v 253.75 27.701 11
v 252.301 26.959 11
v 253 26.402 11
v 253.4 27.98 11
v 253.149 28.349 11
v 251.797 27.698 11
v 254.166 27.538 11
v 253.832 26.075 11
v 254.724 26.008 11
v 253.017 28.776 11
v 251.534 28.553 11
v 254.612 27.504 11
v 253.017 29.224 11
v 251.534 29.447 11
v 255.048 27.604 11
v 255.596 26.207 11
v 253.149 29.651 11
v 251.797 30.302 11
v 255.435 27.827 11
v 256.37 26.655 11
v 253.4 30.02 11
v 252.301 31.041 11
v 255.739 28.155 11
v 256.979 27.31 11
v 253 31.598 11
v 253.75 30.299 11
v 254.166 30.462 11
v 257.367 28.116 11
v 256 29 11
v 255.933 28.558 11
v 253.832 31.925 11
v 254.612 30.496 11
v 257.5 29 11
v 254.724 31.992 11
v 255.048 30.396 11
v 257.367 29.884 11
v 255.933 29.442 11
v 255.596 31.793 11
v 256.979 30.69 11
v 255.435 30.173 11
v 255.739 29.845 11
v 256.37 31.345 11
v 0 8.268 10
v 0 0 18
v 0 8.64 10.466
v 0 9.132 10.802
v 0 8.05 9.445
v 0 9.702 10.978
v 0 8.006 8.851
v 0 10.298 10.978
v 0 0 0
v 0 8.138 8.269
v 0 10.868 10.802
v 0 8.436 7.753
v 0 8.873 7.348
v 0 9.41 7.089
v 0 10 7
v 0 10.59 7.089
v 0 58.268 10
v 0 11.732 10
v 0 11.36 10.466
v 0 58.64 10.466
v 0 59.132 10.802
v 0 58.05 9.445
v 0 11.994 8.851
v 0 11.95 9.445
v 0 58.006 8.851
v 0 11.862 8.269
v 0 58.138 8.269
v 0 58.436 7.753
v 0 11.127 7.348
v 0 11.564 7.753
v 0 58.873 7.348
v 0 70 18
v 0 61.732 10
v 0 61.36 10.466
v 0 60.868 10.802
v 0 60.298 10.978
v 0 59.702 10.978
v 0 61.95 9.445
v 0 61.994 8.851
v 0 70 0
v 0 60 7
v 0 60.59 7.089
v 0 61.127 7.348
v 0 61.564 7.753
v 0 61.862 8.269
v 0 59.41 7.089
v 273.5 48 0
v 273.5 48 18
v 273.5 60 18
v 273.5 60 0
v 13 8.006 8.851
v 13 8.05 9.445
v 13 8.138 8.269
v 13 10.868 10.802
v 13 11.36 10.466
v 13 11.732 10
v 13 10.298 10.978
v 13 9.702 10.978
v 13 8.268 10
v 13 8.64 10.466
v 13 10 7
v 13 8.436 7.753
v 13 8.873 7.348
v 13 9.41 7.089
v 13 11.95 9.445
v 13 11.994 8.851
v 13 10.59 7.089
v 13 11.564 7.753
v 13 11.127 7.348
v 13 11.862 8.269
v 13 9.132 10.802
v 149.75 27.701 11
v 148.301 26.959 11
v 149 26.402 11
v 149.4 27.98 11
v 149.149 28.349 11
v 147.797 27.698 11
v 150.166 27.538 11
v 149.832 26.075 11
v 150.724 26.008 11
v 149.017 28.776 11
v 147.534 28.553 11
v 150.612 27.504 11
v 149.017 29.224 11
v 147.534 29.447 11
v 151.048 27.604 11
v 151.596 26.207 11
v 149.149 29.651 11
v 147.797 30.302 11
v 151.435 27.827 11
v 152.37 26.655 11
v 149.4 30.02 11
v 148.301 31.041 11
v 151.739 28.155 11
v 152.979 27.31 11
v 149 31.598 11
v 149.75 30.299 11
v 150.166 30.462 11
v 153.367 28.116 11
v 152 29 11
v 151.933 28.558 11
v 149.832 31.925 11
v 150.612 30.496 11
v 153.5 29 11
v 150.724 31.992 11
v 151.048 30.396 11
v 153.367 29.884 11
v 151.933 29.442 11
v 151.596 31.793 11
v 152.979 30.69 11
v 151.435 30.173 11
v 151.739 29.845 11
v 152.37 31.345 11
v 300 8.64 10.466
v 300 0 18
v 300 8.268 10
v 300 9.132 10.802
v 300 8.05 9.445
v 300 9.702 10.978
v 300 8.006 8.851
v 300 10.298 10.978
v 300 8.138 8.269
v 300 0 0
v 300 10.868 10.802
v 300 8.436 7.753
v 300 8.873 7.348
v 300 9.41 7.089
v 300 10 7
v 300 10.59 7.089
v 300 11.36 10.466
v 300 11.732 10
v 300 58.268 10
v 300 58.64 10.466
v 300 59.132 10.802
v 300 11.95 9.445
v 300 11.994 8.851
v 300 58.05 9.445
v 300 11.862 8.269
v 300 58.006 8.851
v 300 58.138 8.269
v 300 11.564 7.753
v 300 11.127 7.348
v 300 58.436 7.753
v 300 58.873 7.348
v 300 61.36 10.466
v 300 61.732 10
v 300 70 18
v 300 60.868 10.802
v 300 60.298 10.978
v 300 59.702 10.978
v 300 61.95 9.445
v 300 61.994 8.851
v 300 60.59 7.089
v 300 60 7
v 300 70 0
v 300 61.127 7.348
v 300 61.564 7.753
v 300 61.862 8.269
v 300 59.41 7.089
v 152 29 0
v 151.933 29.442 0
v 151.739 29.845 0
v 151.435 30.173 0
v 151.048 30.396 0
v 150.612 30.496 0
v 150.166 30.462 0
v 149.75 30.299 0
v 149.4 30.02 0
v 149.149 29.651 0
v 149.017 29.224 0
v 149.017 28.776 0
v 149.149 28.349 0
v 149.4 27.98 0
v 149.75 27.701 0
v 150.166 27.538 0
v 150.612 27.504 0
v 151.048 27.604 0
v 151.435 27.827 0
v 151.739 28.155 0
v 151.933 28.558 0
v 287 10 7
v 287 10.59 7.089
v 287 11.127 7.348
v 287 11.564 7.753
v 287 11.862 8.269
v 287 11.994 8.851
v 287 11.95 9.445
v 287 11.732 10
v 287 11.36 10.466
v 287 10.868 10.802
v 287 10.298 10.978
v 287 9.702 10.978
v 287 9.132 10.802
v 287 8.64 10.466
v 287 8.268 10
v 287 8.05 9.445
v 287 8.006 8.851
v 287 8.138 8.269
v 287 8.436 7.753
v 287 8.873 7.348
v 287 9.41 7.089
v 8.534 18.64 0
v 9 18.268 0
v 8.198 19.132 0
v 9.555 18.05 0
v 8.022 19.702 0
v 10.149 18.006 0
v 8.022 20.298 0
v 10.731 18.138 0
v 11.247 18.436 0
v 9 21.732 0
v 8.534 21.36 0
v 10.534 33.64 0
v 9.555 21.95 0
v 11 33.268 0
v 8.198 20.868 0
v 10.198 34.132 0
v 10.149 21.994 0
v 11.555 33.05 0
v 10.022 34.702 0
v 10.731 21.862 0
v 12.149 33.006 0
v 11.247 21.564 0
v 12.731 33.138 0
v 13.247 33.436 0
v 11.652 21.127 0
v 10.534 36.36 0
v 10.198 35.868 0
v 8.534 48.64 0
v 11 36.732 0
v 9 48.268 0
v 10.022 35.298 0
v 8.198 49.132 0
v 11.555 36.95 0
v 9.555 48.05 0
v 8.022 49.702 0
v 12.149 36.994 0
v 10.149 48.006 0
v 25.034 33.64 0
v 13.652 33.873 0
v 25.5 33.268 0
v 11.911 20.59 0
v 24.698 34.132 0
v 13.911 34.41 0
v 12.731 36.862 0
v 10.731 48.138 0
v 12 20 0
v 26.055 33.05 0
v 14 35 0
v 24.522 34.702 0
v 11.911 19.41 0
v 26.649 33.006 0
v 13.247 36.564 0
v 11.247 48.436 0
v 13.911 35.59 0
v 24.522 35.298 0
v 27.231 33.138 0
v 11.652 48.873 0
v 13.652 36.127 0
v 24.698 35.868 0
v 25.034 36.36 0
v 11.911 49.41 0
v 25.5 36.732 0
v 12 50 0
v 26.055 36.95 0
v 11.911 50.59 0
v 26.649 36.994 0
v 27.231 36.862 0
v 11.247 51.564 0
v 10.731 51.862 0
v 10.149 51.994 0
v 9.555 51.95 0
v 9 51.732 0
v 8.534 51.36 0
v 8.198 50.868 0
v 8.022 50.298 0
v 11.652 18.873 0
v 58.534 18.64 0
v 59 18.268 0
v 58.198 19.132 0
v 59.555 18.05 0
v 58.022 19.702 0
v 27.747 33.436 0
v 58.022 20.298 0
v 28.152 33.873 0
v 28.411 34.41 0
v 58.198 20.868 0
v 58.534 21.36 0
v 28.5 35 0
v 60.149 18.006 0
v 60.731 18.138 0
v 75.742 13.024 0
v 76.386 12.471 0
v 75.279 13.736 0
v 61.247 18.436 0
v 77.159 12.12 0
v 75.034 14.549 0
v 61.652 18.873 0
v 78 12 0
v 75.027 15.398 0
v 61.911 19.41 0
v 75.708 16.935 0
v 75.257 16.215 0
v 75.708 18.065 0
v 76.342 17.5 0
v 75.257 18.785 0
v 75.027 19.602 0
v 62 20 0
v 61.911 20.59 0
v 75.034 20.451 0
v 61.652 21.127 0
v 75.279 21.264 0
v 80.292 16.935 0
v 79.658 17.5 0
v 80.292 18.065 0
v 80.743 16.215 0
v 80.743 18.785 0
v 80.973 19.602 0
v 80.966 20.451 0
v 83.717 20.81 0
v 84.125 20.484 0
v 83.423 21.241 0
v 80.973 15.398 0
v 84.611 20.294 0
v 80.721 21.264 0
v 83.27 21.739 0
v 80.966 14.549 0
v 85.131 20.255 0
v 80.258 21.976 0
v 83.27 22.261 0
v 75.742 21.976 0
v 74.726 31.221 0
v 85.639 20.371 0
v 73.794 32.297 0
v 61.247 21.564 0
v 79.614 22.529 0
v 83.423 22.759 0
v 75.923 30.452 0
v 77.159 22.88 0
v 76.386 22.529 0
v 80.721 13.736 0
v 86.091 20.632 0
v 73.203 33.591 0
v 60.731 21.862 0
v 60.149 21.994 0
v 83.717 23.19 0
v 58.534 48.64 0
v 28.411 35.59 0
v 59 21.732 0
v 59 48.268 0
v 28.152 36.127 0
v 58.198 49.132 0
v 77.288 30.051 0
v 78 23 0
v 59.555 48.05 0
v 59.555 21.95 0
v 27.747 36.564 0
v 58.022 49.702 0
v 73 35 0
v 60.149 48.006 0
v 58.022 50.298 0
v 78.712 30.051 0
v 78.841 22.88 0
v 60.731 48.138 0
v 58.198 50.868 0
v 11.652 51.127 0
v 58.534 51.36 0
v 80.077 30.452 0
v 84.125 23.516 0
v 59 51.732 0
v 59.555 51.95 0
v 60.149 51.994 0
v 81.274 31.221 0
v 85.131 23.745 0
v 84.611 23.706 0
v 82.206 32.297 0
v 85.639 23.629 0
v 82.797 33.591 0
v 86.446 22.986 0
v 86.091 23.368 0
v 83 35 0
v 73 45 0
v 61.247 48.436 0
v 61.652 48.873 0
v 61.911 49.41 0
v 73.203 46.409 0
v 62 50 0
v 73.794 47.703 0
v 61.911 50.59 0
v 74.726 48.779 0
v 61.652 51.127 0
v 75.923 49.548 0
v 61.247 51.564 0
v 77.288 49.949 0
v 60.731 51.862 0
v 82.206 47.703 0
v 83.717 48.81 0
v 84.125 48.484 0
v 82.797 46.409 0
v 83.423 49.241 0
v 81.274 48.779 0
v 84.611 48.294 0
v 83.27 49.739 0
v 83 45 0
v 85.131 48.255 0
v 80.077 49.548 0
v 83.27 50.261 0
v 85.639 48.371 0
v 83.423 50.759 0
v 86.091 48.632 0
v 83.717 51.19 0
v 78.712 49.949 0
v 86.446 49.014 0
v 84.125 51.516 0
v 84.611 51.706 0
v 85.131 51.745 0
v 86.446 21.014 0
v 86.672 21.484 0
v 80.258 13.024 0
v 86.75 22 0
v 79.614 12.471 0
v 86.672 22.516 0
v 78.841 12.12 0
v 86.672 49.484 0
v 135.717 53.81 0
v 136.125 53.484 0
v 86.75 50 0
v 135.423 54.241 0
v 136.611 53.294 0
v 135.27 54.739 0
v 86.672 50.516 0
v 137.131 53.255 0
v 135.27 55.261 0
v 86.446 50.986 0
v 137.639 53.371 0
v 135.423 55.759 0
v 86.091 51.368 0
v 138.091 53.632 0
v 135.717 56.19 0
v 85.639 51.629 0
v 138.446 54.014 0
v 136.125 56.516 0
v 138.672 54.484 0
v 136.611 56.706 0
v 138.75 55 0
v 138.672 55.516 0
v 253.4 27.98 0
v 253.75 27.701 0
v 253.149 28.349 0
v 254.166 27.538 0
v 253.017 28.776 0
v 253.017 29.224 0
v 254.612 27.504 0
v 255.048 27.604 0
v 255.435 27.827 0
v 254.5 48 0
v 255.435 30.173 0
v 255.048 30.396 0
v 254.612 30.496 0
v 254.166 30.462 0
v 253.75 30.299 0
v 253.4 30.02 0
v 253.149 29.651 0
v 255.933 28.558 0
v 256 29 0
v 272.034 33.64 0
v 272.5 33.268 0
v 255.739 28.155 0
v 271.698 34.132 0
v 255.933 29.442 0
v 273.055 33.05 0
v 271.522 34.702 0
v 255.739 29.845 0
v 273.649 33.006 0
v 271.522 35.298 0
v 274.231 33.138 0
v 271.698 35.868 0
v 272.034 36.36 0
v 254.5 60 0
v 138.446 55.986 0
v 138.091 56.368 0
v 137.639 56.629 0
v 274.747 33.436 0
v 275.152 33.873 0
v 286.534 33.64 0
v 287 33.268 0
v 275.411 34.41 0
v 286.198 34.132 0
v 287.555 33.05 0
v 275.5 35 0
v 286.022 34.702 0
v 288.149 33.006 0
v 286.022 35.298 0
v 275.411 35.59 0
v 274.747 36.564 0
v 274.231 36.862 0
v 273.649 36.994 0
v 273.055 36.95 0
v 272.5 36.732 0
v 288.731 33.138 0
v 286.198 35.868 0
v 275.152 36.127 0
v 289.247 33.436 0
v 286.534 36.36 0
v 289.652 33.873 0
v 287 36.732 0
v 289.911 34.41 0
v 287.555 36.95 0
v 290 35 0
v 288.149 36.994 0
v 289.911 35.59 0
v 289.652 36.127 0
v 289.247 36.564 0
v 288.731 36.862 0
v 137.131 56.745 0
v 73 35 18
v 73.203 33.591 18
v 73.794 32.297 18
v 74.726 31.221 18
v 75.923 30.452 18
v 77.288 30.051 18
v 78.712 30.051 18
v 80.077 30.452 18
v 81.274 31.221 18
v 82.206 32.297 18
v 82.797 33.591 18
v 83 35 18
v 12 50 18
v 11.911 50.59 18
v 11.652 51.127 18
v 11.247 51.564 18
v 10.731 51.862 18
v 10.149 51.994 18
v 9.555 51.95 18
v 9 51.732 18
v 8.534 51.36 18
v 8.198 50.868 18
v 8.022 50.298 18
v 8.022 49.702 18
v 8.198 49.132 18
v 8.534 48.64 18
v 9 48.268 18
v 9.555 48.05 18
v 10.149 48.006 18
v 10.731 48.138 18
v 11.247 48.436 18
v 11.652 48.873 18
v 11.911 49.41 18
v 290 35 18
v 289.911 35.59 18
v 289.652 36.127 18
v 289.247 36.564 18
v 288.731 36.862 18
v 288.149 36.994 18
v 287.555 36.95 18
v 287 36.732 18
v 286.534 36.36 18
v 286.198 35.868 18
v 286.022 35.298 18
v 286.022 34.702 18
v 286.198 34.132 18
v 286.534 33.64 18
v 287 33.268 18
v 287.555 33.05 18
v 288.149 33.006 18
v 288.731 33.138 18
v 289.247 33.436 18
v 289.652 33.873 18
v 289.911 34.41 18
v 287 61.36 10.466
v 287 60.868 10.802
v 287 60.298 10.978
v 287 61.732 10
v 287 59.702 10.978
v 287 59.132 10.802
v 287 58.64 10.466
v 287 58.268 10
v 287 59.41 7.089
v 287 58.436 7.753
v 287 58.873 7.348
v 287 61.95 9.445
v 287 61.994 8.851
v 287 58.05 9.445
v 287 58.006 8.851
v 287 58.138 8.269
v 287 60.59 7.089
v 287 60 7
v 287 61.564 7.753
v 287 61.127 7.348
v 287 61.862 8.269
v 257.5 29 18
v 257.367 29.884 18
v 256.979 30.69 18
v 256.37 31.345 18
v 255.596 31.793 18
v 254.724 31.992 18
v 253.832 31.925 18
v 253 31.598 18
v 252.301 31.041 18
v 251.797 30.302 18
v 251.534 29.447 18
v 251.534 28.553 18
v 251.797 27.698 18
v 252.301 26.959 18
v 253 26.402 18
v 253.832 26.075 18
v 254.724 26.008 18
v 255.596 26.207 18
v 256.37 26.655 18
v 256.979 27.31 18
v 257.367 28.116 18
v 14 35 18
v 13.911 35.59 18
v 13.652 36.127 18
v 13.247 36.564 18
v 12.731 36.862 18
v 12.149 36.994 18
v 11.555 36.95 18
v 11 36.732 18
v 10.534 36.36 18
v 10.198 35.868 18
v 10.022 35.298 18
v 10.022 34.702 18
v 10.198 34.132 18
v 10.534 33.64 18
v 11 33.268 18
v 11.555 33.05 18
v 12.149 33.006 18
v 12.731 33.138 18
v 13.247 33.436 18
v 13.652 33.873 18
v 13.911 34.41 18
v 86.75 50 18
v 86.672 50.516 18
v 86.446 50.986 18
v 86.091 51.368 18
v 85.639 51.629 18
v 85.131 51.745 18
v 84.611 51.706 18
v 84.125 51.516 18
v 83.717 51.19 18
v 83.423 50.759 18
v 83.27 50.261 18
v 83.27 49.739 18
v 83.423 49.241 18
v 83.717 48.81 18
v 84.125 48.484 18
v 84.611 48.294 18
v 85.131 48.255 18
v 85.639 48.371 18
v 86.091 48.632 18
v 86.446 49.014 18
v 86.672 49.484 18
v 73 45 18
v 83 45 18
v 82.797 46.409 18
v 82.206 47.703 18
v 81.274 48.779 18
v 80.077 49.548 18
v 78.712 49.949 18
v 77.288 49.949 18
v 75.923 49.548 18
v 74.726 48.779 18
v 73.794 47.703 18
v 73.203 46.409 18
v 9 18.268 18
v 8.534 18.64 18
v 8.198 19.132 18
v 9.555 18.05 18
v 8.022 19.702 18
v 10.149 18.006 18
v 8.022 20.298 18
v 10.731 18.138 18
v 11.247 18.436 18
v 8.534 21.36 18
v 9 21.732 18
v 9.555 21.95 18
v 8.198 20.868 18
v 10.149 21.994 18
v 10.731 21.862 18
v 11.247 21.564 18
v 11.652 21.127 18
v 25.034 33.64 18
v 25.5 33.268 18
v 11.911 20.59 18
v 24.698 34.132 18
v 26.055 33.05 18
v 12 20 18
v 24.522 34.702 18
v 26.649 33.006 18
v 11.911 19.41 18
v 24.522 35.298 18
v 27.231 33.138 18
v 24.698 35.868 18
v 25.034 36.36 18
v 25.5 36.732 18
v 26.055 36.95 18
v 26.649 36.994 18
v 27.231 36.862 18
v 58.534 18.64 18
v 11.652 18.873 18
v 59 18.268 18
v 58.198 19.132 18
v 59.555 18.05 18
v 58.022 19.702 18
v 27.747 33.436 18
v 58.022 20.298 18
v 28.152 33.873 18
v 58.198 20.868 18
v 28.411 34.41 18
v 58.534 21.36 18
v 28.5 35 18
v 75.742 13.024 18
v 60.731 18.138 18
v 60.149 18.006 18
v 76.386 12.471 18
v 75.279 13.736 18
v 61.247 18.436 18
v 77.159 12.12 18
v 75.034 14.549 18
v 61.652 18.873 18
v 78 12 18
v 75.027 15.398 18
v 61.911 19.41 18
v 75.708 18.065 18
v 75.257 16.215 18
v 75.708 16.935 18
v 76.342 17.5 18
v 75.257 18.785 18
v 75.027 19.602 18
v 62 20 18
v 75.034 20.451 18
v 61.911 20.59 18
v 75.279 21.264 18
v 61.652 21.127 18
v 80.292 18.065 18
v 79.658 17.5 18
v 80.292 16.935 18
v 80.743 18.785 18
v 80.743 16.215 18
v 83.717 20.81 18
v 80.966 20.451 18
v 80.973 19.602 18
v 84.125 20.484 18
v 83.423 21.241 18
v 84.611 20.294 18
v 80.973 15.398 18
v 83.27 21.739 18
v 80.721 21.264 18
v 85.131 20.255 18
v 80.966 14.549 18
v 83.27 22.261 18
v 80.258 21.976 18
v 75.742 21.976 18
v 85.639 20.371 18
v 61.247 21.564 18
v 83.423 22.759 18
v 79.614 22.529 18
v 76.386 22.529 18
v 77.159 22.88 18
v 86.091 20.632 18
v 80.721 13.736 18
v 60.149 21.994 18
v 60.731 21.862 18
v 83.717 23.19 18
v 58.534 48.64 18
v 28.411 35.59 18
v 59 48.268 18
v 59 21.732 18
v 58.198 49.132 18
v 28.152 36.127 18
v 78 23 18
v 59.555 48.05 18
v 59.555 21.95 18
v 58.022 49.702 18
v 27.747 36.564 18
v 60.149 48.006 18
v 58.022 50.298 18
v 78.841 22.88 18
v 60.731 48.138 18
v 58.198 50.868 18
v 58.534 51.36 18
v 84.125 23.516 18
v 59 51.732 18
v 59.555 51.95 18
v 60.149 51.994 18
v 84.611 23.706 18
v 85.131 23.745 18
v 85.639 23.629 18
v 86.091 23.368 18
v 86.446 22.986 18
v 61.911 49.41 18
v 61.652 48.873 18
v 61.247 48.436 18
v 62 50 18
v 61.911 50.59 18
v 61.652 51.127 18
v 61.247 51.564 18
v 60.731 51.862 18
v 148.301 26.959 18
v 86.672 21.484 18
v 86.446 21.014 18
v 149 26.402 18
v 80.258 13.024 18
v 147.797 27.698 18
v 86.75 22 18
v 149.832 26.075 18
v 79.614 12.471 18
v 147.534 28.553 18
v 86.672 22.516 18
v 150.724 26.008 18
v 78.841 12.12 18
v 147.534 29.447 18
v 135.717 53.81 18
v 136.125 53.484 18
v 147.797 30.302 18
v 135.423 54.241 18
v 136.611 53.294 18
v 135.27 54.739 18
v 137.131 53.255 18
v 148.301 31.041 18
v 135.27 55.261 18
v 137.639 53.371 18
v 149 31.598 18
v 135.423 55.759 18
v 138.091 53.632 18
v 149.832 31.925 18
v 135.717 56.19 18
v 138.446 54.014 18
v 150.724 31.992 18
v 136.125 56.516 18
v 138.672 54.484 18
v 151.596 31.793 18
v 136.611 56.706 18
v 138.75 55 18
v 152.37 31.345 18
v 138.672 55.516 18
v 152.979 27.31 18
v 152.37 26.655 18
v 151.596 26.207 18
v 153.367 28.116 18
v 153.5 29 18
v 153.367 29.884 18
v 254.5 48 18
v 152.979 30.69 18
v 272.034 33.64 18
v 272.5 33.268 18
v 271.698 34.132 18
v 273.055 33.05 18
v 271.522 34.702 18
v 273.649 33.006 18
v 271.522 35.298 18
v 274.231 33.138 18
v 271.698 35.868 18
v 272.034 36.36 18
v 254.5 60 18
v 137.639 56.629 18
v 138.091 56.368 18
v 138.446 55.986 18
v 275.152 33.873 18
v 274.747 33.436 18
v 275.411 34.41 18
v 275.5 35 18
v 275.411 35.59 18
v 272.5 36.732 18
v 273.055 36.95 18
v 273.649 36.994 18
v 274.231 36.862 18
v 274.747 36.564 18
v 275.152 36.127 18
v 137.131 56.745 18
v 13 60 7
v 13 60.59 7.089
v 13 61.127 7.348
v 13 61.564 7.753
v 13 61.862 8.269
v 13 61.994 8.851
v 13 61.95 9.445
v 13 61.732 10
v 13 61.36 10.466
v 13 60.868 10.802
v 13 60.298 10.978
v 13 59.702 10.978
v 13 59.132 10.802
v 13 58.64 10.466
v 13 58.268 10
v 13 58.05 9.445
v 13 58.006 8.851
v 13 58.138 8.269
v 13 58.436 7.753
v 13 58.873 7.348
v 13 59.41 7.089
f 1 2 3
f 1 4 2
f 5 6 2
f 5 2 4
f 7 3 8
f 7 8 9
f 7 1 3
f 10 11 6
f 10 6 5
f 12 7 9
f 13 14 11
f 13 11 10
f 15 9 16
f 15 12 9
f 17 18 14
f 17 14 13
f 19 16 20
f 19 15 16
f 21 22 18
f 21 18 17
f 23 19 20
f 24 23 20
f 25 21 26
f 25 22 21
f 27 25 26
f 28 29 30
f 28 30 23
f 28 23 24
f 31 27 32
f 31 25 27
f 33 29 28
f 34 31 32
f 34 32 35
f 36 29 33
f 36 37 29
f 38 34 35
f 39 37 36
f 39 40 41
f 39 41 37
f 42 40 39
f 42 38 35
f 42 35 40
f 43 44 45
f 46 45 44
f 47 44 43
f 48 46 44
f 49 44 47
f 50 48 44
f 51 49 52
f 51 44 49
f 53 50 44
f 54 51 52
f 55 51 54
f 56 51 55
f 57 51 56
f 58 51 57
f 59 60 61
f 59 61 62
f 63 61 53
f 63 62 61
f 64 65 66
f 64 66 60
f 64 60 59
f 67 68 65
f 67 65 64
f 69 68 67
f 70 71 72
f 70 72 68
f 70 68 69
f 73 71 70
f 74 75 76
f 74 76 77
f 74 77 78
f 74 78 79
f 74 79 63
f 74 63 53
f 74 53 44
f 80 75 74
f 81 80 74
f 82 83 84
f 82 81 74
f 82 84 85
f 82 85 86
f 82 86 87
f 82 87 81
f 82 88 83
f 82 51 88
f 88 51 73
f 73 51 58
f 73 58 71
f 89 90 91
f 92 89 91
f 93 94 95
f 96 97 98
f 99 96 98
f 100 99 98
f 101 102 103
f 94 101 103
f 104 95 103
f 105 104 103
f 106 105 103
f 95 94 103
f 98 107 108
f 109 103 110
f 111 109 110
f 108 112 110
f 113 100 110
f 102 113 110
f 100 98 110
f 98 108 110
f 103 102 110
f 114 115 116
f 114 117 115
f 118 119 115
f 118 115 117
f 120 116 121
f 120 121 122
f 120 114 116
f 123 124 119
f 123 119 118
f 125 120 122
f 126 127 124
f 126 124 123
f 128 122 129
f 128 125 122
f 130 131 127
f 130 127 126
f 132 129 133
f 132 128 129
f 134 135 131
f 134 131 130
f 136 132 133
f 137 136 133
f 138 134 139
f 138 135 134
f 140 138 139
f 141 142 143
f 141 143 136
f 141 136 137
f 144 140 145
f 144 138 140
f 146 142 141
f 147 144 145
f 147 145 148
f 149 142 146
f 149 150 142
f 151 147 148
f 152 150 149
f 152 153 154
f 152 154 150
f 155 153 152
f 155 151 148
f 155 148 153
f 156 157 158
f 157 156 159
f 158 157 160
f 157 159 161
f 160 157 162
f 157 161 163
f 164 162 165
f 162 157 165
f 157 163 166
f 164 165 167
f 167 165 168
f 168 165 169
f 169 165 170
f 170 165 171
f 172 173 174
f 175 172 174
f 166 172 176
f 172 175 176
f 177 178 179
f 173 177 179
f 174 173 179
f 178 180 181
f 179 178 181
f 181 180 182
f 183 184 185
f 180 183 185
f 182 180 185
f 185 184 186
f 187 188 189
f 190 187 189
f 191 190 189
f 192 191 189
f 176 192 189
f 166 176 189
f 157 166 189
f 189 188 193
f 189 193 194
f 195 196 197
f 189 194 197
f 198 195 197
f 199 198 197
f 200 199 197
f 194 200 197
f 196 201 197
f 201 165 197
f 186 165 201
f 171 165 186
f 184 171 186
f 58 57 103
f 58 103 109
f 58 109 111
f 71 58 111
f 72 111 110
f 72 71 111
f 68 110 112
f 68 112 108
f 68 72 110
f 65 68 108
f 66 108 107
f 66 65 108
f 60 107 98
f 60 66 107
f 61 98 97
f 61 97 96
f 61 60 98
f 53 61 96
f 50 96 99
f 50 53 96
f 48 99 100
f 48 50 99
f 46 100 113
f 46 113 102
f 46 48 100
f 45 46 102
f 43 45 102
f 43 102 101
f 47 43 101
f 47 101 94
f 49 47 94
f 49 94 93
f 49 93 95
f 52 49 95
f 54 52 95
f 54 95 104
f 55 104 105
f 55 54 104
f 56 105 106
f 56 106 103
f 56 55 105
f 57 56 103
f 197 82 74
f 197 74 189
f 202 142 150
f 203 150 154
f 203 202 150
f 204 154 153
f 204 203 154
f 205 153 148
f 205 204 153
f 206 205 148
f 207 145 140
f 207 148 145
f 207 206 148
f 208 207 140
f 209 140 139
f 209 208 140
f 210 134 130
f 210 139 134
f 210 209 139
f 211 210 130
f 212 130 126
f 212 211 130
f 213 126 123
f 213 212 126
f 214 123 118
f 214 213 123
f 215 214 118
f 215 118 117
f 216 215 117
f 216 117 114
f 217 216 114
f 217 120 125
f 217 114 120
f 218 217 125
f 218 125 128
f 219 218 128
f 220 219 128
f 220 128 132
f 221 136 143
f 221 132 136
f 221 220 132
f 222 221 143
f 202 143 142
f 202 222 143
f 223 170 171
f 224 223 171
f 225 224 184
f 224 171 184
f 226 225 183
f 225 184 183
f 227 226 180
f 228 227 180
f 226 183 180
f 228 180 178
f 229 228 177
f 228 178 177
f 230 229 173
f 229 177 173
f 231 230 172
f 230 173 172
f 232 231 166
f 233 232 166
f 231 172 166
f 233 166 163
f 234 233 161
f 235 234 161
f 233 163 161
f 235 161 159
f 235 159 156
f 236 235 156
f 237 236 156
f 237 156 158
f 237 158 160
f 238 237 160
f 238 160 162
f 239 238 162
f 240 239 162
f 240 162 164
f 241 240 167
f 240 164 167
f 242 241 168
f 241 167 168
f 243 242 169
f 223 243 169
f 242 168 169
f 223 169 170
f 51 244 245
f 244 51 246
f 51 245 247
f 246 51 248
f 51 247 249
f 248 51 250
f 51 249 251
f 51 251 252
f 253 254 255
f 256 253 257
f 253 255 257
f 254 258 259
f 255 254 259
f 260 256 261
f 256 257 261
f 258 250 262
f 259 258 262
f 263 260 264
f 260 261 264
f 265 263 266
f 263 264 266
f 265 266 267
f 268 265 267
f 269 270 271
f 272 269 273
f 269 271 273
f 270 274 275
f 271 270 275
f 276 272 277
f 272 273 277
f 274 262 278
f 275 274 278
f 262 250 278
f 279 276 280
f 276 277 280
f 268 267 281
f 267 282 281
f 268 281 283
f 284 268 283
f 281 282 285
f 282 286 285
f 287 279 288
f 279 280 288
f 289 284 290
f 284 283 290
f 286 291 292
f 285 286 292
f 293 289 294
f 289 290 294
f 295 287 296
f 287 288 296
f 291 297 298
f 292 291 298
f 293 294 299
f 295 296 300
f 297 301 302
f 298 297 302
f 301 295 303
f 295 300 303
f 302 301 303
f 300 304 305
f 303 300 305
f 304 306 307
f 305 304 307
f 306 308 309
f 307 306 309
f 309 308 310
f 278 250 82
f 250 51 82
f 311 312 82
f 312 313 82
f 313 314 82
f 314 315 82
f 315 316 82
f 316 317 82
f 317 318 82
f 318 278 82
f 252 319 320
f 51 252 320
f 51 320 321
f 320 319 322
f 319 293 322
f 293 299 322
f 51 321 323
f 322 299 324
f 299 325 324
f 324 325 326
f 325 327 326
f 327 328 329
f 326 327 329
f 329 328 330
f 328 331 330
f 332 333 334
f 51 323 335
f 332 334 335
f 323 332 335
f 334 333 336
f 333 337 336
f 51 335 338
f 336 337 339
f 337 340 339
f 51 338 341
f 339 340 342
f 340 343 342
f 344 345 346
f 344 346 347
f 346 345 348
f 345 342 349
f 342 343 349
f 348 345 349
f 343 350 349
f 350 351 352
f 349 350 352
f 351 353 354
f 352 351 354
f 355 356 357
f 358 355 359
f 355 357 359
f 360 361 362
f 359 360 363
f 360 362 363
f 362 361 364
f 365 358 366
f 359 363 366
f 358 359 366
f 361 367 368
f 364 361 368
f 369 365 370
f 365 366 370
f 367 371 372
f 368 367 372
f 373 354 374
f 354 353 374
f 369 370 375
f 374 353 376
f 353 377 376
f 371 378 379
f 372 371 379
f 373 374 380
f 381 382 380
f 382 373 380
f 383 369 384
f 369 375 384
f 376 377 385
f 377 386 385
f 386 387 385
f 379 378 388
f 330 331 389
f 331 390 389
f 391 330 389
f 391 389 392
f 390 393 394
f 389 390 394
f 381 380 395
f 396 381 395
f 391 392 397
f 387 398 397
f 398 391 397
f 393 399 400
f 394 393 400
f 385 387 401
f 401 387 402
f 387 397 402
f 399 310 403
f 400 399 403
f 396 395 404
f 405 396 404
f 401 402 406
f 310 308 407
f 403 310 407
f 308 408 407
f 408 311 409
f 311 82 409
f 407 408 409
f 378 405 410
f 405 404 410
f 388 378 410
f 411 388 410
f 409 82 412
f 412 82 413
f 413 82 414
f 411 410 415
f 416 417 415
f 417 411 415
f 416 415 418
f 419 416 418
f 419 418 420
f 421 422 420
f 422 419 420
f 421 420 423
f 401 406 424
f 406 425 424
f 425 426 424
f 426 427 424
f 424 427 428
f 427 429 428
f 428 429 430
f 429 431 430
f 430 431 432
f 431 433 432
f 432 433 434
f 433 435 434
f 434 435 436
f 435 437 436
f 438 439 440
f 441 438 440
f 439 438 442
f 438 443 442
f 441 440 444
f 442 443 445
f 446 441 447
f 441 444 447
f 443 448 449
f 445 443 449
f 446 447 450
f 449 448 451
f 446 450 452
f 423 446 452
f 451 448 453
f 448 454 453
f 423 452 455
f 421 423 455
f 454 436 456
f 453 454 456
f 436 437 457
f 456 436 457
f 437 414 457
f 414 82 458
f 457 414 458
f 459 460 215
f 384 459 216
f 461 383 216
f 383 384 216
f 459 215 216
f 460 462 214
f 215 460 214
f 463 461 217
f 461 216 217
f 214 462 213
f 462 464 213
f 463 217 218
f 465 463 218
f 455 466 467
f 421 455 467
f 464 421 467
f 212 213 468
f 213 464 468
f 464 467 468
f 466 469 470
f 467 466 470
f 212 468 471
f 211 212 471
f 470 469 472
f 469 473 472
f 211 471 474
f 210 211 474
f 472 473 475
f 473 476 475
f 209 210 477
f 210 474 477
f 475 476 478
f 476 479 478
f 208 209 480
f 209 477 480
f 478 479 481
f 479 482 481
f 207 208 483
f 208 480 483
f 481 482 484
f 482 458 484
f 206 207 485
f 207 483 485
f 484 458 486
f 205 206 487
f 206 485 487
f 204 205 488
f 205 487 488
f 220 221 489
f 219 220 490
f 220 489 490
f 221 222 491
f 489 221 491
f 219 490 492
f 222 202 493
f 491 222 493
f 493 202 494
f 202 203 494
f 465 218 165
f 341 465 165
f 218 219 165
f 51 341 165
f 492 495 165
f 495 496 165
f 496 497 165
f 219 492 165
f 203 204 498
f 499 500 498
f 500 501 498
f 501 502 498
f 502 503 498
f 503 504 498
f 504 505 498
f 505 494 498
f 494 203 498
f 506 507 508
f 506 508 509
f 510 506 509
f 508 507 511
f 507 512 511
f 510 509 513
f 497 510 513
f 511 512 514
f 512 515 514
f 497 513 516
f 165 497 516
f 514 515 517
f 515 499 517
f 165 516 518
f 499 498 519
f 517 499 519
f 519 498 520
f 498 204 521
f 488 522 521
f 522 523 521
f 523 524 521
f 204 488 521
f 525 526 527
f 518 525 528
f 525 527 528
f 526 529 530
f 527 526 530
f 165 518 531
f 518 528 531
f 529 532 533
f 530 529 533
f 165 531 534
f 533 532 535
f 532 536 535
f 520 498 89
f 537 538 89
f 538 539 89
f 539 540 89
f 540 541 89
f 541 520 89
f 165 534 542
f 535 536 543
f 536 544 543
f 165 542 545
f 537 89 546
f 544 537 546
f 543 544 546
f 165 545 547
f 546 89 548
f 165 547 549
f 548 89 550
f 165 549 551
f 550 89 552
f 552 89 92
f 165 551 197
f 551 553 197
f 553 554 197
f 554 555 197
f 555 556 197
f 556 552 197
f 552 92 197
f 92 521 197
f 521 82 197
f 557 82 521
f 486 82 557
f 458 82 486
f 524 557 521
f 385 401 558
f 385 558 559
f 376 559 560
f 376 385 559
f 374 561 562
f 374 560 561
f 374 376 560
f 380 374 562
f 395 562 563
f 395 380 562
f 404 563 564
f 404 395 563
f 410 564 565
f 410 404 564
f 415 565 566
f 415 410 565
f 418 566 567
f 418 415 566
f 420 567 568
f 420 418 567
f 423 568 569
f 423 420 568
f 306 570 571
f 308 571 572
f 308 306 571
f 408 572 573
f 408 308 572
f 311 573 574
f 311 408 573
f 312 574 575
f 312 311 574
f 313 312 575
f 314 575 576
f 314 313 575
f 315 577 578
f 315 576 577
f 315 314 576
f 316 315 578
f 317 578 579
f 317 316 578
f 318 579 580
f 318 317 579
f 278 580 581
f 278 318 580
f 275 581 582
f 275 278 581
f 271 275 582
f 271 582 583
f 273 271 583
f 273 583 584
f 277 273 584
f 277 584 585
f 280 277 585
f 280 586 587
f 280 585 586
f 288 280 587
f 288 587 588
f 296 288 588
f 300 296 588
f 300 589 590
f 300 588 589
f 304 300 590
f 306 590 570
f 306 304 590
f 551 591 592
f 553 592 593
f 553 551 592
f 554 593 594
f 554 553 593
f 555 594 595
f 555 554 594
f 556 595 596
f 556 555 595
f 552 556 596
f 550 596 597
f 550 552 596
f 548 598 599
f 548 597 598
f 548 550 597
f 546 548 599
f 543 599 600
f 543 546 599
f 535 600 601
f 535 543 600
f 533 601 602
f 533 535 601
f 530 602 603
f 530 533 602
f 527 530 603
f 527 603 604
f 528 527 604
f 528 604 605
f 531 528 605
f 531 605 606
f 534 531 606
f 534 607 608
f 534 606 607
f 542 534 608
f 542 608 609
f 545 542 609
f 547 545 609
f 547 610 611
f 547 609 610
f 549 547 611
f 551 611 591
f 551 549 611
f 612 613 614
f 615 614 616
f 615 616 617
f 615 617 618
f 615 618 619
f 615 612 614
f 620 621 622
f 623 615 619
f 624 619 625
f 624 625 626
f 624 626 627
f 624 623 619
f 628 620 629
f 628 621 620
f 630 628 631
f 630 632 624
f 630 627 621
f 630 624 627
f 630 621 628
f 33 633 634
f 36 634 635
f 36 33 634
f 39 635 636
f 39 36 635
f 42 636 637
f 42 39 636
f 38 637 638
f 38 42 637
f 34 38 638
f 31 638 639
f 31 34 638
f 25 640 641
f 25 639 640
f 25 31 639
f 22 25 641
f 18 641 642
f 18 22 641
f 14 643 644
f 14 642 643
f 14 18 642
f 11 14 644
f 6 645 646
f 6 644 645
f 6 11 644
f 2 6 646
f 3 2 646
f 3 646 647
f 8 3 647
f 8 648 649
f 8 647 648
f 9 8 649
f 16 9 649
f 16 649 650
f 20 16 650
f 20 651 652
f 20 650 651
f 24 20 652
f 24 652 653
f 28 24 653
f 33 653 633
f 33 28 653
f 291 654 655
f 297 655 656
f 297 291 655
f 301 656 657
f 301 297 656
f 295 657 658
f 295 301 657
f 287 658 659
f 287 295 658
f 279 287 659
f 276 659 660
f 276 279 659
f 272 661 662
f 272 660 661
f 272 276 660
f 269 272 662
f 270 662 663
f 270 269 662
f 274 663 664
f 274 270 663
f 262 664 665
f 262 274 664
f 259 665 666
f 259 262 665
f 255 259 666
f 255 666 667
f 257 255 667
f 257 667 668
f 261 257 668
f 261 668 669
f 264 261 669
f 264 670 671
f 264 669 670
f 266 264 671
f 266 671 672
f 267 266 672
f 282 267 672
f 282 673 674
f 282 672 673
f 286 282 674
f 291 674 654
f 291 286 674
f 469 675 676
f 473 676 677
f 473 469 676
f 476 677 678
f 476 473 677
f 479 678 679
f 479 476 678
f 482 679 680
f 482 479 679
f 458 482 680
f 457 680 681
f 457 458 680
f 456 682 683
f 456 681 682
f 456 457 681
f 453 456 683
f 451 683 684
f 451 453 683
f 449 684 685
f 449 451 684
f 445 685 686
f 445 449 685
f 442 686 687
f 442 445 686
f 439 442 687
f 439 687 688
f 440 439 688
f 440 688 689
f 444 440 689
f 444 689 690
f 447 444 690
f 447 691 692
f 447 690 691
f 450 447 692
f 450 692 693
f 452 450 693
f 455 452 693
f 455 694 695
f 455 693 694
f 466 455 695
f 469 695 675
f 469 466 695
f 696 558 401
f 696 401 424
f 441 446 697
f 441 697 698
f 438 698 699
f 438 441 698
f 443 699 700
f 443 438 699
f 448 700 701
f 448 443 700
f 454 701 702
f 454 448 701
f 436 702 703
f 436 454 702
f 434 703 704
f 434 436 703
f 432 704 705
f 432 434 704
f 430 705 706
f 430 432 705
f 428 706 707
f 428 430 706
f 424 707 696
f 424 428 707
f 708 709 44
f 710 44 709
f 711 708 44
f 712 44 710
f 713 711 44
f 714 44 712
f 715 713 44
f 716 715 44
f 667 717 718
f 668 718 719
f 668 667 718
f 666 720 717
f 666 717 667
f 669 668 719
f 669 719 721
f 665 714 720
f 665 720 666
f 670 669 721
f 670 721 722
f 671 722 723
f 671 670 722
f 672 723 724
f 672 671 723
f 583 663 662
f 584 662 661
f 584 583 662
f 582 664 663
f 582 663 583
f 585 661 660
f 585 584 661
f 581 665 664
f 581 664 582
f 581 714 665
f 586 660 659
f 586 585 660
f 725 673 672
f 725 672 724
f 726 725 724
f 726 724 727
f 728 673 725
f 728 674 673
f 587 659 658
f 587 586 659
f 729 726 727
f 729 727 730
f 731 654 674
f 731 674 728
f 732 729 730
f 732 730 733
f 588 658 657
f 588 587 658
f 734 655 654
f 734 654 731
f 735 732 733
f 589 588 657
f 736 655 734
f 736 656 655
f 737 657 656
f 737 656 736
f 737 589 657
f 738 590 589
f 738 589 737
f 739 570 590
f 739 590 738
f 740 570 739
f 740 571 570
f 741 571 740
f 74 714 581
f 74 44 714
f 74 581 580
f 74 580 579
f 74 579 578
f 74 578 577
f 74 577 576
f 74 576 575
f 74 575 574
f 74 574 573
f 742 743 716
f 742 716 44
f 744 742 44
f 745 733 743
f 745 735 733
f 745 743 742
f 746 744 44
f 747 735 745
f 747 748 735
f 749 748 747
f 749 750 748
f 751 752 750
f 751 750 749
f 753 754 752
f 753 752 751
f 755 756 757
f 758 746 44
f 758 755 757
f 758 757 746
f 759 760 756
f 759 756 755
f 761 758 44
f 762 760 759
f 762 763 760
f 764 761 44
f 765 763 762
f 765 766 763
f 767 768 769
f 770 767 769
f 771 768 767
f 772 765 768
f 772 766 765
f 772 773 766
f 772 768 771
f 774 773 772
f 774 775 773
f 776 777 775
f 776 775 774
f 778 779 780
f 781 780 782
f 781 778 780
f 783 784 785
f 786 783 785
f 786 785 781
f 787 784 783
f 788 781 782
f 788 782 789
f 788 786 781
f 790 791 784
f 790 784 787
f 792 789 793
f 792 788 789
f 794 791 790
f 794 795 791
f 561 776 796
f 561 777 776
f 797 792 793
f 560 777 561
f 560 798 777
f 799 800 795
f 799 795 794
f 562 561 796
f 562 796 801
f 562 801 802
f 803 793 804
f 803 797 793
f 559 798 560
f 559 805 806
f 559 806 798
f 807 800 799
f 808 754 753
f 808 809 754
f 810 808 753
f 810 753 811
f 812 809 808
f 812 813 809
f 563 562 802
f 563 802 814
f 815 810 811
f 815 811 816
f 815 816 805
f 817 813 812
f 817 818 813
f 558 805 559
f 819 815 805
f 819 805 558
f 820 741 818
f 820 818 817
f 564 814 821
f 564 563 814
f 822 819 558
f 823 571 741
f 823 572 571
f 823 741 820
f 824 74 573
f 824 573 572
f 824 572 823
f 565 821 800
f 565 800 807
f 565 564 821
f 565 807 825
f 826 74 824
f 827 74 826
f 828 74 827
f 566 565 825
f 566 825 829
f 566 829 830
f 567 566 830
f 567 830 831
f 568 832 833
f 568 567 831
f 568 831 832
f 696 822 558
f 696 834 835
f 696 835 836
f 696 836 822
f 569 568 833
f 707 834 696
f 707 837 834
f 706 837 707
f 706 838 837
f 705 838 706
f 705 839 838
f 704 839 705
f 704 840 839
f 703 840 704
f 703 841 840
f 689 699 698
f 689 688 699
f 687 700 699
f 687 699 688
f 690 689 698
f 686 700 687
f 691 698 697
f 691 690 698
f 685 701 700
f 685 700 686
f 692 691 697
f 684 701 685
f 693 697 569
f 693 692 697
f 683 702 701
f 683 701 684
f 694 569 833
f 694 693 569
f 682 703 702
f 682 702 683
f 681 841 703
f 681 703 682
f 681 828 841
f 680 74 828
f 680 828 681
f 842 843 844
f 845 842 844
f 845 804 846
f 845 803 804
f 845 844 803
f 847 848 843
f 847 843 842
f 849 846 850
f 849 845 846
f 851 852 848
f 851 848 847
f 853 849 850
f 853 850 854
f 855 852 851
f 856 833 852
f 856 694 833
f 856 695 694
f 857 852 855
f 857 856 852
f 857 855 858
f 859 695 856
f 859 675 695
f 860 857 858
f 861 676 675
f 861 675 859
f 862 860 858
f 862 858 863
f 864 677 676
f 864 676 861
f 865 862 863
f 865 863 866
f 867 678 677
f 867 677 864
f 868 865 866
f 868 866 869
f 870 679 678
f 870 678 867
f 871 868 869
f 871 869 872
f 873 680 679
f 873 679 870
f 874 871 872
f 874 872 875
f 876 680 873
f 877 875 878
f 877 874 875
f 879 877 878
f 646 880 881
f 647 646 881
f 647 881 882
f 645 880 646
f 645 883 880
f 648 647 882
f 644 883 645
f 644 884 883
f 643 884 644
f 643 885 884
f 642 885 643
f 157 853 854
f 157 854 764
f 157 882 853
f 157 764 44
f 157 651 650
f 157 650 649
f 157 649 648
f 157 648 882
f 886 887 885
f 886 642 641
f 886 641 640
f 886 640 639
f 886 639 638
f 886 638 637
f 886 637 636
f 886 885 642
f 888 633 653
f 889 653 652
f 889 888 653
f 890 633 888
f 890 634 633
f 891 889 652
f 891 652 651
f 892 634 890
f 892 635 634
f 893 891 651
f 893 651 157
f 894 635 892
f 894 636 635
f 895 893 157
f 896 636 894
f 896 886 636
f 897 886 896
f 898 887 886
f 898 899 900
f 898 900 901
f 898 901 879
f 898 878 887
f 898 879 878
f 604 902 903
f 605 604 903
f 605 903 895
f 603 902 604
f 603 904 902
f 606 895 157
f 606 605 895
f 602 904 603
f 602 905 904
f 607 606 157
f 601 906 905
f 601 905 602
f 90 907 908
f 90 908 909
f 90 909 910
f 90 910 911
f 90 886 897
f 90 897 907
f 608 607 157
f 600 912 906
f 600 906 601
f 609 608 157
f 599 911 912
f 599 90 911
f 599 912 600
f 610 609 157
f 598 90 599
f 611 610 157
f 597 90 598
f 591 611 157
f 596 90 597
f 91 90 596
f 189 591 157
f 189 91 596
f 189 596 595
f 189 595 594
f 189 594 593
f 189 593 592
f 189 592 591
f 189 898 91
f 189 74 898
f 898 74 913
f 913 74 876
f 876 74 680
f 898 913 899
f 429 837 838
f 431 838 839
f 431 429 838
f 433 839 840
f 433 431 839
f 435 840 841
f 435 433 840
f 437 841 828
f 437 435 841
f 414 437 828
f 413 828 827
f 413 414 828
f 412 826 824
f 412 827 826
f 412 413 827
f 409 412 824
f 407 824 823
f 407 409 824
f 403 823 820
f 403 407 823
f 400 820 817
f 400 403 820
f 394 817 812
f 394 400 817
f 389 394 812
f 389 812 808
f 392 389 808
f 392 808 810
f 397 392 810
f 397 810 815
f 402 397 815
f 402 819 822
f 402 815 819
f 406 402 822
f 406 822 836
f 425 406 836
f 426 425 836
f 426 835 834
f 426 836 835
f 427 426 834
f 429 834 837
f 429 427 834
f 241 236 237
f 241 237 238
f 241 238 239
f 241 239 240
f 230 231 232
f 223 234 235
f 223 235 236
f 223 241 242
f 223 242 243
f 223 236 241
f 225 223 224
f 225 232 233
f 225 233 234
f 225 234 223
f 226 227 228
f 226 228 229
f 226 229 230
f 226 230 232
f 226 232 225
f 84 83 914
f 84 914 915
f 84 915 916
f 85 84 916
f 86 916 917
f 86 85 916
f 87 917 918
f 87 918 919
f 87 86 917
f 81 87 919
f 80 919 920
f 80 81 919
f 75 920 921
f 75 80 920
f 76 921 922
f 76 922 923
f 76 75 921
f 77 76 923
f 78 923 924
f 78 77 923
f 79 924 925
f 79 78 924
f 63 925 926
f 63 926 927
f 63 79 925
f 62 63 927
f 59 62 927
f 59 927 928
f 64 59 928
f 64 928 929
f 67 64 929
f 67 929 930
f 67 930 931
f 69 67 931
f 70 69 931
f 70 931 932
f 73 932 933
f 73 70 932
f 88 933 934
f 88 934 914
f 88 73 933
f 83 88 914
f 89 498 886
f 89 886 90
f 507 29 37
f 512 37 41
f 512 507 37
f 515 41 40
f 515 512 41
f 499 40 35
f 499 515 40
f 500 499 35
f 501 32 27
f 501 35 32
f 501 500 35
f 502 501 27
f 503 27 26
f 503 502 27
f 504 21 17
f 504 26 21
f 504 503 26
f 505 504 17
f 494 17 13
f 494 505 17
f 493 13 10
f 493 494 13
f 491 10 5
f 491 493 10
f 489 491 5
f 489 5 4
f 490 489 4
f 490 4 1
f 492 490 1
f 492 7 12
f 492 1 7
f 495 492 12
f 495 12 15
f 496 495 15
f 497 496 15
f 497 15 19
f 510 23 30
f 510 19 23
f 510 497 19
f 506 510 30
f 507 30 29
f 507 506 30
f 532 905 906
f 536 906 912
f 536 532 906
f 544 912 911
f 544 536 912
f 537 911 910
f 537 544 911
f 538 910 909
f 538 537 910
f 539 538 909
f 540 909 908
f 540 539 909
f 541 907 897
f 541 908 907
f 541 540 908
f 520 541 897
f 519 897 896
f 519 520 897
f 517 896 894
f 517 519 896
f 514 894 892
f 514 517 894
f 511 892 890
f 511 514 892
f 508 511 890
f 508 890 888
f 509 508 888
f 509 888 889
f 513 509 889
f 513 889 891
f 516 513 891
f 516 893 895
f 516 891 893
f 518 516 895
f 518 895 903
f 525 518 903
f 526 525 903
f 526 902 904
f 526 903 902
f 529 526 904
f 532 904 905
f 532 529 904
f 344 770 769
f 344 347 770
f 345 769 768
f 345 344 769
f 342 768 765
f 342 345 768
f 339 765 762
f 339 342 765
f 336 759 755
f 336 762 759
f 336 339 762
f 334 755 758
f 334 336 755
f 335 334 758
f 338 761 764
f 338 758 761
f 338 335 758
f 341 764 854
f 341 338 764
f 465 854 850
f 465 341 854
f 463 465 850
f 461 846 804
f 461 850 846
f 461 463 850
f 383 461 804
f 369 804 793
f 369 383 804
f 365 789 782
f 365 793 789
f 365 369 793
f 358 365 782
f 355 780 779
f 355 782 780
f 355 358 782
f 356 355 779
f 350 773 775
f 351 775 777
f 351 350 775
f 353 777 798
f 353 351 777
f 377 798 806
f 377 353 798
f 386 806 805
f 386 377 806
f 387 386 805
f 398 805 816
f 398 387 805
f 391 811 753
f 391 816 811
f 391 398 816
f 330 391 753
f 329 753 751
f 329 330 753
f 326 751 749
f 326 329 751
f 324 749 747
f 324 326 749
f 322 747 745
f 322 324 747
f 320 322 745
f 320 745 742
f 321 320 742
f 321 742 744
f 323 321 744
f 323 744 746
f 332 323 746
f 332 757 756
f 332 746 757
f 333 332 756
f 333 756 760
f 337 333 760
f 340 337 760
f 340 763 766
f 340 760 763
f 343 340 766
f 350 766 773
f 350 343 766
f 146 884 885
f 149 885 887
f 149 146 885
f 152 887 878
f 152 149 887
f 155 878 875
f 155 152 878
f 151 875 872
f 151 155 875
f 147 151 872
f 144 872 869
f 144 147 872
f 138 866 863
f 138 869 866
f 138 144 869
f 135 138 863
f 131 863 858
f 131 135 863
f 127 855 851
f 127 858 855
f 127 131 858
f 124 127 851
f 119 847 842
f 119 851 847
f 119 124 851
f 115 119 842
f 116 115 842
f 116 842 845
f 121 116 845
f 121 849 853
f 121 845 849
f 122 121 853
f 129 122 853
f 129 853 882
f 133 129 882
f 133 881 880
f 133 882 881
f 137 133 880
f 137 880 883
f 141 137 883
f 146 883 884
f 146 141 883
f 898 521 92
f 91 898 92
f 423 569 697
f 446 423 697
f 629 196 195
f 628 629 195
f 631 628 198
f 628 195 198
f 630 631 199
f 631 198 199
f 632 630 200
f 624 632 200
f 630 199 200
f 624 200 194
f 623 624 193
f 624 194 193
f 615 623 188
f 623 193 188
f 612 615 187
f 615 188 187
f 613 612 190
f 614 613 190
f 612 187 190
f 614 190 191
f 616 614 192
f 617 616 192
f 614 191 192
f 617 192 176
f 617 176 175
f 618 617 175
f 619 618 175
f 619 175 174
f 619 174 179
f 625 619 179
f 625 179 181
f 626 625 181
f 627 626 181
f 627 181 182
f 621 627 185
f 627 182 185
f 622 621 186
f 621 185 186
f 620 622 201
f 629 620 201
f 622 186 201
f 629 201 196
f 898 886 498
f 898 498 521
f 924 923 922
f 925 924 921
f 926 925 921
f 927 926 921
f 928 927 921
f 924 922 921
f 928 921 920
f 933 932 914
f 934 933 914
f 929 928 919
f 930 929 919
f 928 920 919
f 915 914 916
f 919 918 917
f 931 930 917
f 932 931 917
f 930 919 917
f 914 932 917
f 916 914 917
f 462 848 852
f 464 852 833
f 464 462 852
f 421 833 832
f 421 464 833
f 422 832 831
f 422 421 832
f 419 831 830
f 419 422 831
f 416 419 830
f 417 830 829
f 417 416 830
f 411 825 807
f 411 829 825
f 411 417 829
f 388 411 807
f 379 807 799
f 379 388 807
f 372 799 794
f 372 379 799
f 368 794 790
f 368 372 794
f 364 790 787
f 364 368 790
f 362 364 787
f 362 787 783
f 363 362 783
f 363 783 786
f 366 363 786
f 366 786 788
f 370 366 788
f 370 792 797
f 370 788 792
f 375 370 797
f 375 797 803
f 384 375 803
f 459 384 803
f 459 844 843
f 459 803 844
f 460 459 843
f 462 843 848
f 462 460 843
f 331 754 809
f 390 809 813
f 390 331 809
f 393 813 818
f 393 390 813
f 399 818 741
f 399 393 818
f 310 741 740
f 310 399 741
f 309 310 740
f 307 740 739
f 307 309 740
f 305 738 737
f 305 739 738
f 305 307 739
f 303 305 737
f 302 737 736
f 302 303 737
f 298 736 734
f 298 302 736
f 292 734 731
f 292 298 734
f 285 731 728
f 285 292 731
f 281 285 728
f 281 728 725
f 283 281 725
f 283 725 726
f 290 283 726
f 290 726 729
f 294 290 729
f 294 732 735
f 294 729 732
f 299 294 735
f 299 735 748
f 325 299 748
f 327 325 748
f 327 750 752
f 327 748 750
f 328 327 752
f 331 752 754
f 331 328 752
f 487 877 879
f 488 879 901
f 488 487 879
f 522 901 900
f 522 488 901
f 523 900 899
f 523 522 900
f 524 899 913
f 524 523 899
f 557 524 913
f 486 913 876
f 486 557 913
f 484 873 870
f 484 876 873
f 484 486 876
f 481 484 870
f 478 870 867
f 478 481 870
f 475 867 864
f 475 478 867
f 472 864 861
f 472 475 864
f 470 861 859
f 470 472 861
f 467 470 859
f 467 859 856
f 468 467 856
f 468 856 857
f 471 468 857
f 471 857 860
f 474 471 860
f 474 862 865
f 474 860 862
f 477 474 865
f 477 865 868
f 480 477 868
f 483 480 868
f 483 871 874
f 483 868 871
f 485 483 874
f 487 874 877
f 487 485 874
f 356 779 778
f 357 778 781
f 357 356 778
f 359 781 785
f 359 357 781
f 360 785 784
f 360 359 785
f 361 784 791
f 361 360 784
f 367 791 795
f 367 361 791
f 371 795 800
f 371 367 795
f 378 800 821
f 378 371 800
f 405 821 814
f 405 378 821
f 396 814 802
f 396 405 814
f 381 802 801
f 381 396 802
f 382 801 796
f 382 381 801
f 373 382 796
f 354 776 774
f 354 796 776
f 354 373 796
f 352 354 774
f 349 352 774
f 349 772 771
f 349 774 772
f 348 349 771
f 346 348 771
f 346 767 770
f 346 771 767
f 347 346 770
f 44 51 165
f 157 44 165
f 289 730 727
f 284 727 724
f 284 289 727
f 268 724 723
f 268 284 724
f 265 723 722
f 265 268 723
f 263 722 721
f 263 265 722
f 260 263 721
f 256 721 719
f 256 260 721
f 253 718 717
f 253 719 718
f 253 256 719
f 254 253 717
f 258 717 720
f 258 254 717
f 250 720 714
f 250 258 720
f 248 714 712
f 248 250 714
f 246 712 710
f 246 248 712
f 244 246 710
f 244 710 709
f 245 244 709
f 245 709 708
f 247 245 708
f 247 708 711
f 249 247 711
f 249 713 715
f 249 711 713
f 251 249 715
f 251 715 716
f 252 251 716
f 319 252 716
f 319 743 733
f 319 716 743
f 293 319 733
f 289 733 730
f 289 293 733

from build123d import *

# Parameters (mm, degrees)
CYLINDER020_R           = 2
CYLINDER020_DEPTH       = 13
CYLINDER020_PITCH_ANGLE = 90
CYLINDER019_R           = 2
CYLINDER019_DEPTH       = 13
CYLINDER019_PITCH_ANGLE = 90
BOX002_W                = 19
BOX002_H                = 12
BOX002_DEPTH            = 25
CYLINDER017_R           = 2
CYLINDER017_DEPTH       = 25
CYLINDER018_R           = 2
CYLINDER018_DEPTH       = 25
CYLINDER015_R           = 1.5
CYLINDER015_DEPTH       = 25
CYLINDER016_R           = 3
CYLINDER016_DEPTH       = 25
CYLINDER013_R           = 1.5
CYLINDER013_DEPTH       = 25
CYLINDER014_R           = 3
CYLINDER014_DEPTH       = 25
CYLINDER012_R           = 1.75
CYLINDER012_DEPTH       = 25
CYLINDER011_R           = 1.75
CYLINDER011_DEPTH       = 25
CYLINDER010_R           = 1.75
CYLINDER010_DEPTH       = 25
CYLINDER002_R           = 2
CYLINDER002_DEPTH       = 25
CYLINDER003_R           = 2
CYLINDER003_DEPTH       = 25
CYLINDER004_R           = 2
CYLINDER004_DEPTH       = 25
CYLINDER005_R           = 2
CYLINDER005_DEPTH       = 25
CYLINDER006_R           = 3
CYLINDER006_DEPTH       = 25
CYLINDER007_R           = 3
CYLINDER007_DEPTH       = 25
CYLINDER008_R           = 5
CYLINDER008_DEPTH       = 25
CYLINDER009_R           = 5
CYLINDER009_DEPTH       = 25
BOX001_W                = 10
BOX001_H                = 10
BOX001_DEPTH            = 25
CYLINDER_R              = 2
CYLINDER_DEPTH          = 25
CYLINDER001_R           = 2
CYLINDER001_DEPTH       = 25
BOX_W                   = 300
BOX_H                   = 70
BOX_DEPTH               = 18


with BuildPart() as cilindro020:
    # Cylinder020 → Cylinder020 (new body)
    with BuildSketch(Plane.XY):
        Circle(CYLINDER020_R)
    extrude(amount=CYLINDER020_DEPTH)


with BuildPart() as cilindro020_1:
    # Cylinder020 pitch: moved
    add(cilindro020.part.rotate(Axis((0, 0, 0), (0, 1, 0)), CYLINDER020_PITCH_ANGLE))


with BuildPart() as cilindro020_2:
    # Cylinder020 placement: moved
    add(cilindro020_1.part.moved(Location((0, 60, 9))))


with BuildPart() as mirror_of_cilindro020:
    # mirror001: instance of Cilindro020
    add(cilindro020_2.part.mirror(Plane(origin=(300, 0, 18), x_dir=(0, -1, 0), z_dir=(1, 0, 0))))


with BuildPart() as mirror_of_cilindro020_1:
    # mirror001 placement: moved
    add(mirror_of_cilindro020.part.moved(Location((-300, 0, 0))))


with BuildPart() as cilindro019:
    # Cylinder019 → Cylinder019 (new body)
    with BuildSketch(Plane.XY):
        Circle(CYLINDER019_R)
    extrude(amount=CYLINDER019_DEPTH)


with BuildPart() as cilindro019_1:
    # Cylinder019 pitch: moved
    add(cilindro019.part.rotate(Axis((0, 0, 0), (0, 1, 0)), CYLINDER019_PITCH_ANGLE))


with BuildPart() as cilindro019_2:
    # Cylinder019 placement: moved
    add(cilindro019_1.part.moved(Location((0, 10, 9))))


with BuildPart() as mirror_of_cilindro019:
    # mirror: instance of Cilindro019
    add(cilindro019_2.part.mirror(Plane(origin=(300, 0, 18), x_dir=(0, -1, 0), z_dir=(1, 0, 0))))


with BuildPart() as mirror_of_cilindro019_1:
    # mirror placement: moved
    add(mirror_of_cilindro019.part.moved(Location((-300, 0, 0))))


with BuildPart() as cubo002:
    # Box002 → Box002 (new body)
    with BuildSketch(Plane(origin=(254.5, 48, 0), x_dir=(1, 0, 0), z_dir=(0, 0, 1))):
        with Locations((9.5, 6)):
            Rectangle(BOX002_W, BOX002_H)
    extrude(amount=BOX002_DEPTH)


with BuildPart() as cilindro017:
    # Cylinder017 → Cylinder017 (new body)
    with BuildSketch(Plane(origin=(288, 35, 0), x_dir=(1, 0, 0), z_dir=(0, 0, 1))):
        Circle(CYLINDER017_R)
    extrude(amount=CYLINDER017_DEPTH)


with BuildPart() as cilindro018:
    # Cylinder018 → Cylinder018 (new body)
    with BuildSketch(Plane(origin=(273.5, 35, 0), x_dir=(1, 0, 0), z_dir=(0, 0, 1))):
        Circle(CYLINDER018_R)
    extrude(amount=CYLINDER018_DEPTH)


with BuildPart() as cilindro015:
    # Cylinder015 → Cylinder015 (new body)
    with BuildSketch(Plane(origin=(150.5, 29, 0), x_dir=(1, 0, 0), z_dir=(0, 0, 1))):
        Circle(CYLINDER015_R)
    extrude(amount=CYLINDER015_DEPTH)


with BuildPart() as fusion002:
    # Cylinder016 → Cylinder016 (new body)
    with BuildSketch(Plane(origin=(150.5, 29, 11), x_dir=(1, 0, 0), z_dir=(0, 0, 1))):
        Circle(CYLINDER016_R)
    extrude(amount=CYLINDER016_DEPTH)

    # Fusion002: union Cilindro015
    add(cilindro015.part)


with BuildPart() as fusion002_1:
    # Fusion002 placement: moved
    add(fusion002.part.moved(Location((104, 0, 0))))


with BuildPart() as cilindro013:
    # Cylinder013 → Cylinder013 (new body)
    with BuildSketch(Plane(origin=(150.5, 29, 0), x_dir=(1, 0, 0), z_dir=(0, 0, 1))):
        Circle(CYLINDER013_R)
    extrude(amount=CYLINDER013_DEPTH)


with BuildPart() as fusion001:
    # Cylinder014 → Cylinder014 (new body)
    with BuildSketch(Plane(origin=(150.5, 29, 11), x_dir=(1, 0, 0), z_dir=(0, 0, 1))):
        Circle(CYLINDER014_R)
    extrude(amount=CYLINDER014_DEPTH)

    # Fusion001: union Cilindro013
    add(cilindro013.part)


with BuildPart() as cilindro012:
    # Cylinder012 → Cylinder012 (new body)
    with BuildSketch(Plane(origin=(137, 55, 0), x_dir=(1, 0, 0), z_dir=(0, 0, 1))):
        Circle(CYLINDER012_R)
    extrude(amount=CYLINDER012_DEPTH)


with BuildPart() as cilindro011:
    # Cylinder011 → Cylinder011 (new body)
    with BuildSketch(Plane(origin=(85, 50, 0), x_dir=(1, 0, 0), z_dir=(0, 0, 1))):
        Circle(CYLINDER011_R)
    extrude(amount=CYLINDER011_DEPTH)


with BuildPart() as cilindro010:
    # Cylinder010 → Cylinder010 (new body)
    with BuildSketch(Plane(origin=(85, 22, 0), x_dir=(1, 0, 0), z_dir=(0, 0, 1))):
        Circle(CYLINDER010_R)
    extrude(amount=CYLINDER010_DEPTH)


with BuildPart() as cilindro002:
    # Cylinder002 → Cylinder002 (new body)
    with BuildSketch(Plane(origin=(60, 20, 0), x_dir=(1, 0, 0), z_dir=(0, 0, 1))):
        Circle(CYLINDER002_R)
    extrude(amount=CYLINDER002_DEPTH)


with BuildPart() as cilindro003:
    # Cylinder003 → Cylinder003 (new body)
    with BuildSketch(Plane(origin=(60, 50, 0), x_dir=(1, 0, 0), z_dir=(0, 0, 1))):
        Circle(CYLINDER003_R)
    extrude(amount=CYLINDER003_DEPTH)


with BuildPart() as cilindro004:
    # Cylinder004 → Cylinder004 (new body)
    with BuildSketch(Plane(origin=(12, 35, 0), x_dir=(1, 0, 0), z_dir=(0, 0, 1))):
        Circle(CYLINDER004_R)
    extrude(amount=CYLINDER004_DEPTH)


with BuildPart() as cilindro005:
    # Cylinder005 → Cylinder005 (new body)
    with BuildSketch(Plane(origin=(26.5, 35, 0), x_dir=(1, 0, 0), z_dir=(0, 0, 1))):
        Circle(CYLINDER005_R)
    extrude(amount=CYLINDER005_DEPTH)


with BuildPart() as cilindro006:
    # Cylinder006 → Cylinder006 (new body)
    with BuildSketch(Plane(origin=(78, 15, 0), x_dir=(1, 0, 0), z_dir=(0, 0, 1))):
        Circle(CYLINDER006_R)
    extrude(amount=CYLINDER006_DEPTH)


with BuildPart() as cilindro007:
    # Cylinder007 → Cylinder007 (new body)
    with BuildSketch(Plane(origin=(78, 20, 0), x_dir=(1, 0, 0), z_dir=(0, 0, 1))):
        Circle(CYLINDER007_R)
    extrude(amount=CYLINDER007_DEPTH)


with BuildPart() as cilindro008:
    # Cylinder008 → Cylinder008 (new body)
    with BuildSketch(Plane(origin=(78, 35, 0), x_dir=(1, 0, 0), z_dir=(0, 0, 1))):
        Circle(CYLINDER008_R)
    extrude(amount=CYLINDER008_DEPTH)


with BuildPart() as cilindro009:
    # Cylinder009 → Cylinder009 (new body)
    with BuildSketch(Plane(origin=(78, 45, 0), x_dir=(1, 0, 0), z_dir=(0, 0, 1))):
        Circle(CYLINDER009_R)
    extrude(amount=CYLINDER009_DEPTH)


with BuildPart() as cubo001:
    # Box001 → Box001 (new body)
    with BuildSketch(Plane(origin=(73, 35, 0), x_dir=(1, 0, 0), z_dir=(0, 0, 1))):
        with Locations((5, 5)):
            Rectangle(BOX001_W, BOX001_H)
    extrude(amount=BOX001_DEPTH)


with BuildPart() as cilindro:
    # Cylinder → Cylinder (new body)
    with BuildSketch(Plane(origin=(10, 20, 0), x_dir=(1, 0, 0), z_dir=(0, 0, 1))):
        Circle(CYLINDER_R)
    extrude(amount=CYLINDER_DEPTH)


with BuildPart() as fusion:
    # Cylinder001 → Cylinder001 (new body)
    with BuildSketch(Plane(origin=(10, 50, 0), x_dir=(1, 0, 0), z_dir=(0, 0, 1))):
        Circle(CYLINDER001_R)
    extrude(amount=CYLINDER001_DEPTH)

    # Fusion: union Cilindro002, Cilindro003, Cilindro004, Cilindro005, Cilindro006, Cilindro007, Cilindro008, Cilindro009, Cubo001, Cilindro
    add(cilindro002.part)
    add(cilindro003.part)
    add(cilindro004.part)
    add(cilindro005.part)
    add(cilindro006.part)
    add(cilindro007.part)
    add(cilindro008.part)
    add(cilindro009.part)
    add(cubo001.part)
    add(cilindro.part)


with BuildPart() as cut012:
    # Box → Box (new body)
    with BuildSketch(Plane.XY):
        with Locations((150, 35)):
            Rectangle(BOX_W, BOX_H)
    extrude(amount=BOX_DEPTH)

    # Cut: cut Fusion
    add(fusion.part, mode=Mode.SUBTRACT)

    # Cut001: cut Cilindro010
    add(cilindro010.part, mode=Mode.SUBTRACT)

    # Cut002: cut Cilindro011
    add(cilindro011.part, mode=Mode.SUBTRACT)

    # Cut003: cut Cilindro012
    add(cilindro012.part, mode=Mode.SUBTRACT)

    # Cut004: cut Fusion001
    add(fusion001.part, mode=Mode.SUBTRACT)

    # Cut005: cut Fusion002
    add(fusion002_1.part, mode=Mode.SUBTRACT)

    # Cut006: cut Cilindro018
    add(cilindro018.part, mode=Mode.SUBTRACT)

    # Cut007: cut Cilindro017
    add(cilindro017.part, mode=Mode.SUBTRACT)

    # Cut008: cut Cubo002
    add(cubo002.part, mode=Mode.SUBTRACT)

    # Cut009: cut Cilindro019
    add(cilindro019_2.part, mode=Mode.SUBTRACT)

    # Cut010: cut Cilindro020
    add(cilindro020_2.part, mode=Mode.SUBTRACT)

    # Cut011: cut Mirror of Cilindro019
    add(mirror_of_cilindro019_1.part, mode=Mode.SUBTRACT)

    # Cut012: cut Mirror of Cilindro020
    add(mirror_of_cilindro020_1.part, mode=Mode.SUBTRACT)


solid = cut012.part
